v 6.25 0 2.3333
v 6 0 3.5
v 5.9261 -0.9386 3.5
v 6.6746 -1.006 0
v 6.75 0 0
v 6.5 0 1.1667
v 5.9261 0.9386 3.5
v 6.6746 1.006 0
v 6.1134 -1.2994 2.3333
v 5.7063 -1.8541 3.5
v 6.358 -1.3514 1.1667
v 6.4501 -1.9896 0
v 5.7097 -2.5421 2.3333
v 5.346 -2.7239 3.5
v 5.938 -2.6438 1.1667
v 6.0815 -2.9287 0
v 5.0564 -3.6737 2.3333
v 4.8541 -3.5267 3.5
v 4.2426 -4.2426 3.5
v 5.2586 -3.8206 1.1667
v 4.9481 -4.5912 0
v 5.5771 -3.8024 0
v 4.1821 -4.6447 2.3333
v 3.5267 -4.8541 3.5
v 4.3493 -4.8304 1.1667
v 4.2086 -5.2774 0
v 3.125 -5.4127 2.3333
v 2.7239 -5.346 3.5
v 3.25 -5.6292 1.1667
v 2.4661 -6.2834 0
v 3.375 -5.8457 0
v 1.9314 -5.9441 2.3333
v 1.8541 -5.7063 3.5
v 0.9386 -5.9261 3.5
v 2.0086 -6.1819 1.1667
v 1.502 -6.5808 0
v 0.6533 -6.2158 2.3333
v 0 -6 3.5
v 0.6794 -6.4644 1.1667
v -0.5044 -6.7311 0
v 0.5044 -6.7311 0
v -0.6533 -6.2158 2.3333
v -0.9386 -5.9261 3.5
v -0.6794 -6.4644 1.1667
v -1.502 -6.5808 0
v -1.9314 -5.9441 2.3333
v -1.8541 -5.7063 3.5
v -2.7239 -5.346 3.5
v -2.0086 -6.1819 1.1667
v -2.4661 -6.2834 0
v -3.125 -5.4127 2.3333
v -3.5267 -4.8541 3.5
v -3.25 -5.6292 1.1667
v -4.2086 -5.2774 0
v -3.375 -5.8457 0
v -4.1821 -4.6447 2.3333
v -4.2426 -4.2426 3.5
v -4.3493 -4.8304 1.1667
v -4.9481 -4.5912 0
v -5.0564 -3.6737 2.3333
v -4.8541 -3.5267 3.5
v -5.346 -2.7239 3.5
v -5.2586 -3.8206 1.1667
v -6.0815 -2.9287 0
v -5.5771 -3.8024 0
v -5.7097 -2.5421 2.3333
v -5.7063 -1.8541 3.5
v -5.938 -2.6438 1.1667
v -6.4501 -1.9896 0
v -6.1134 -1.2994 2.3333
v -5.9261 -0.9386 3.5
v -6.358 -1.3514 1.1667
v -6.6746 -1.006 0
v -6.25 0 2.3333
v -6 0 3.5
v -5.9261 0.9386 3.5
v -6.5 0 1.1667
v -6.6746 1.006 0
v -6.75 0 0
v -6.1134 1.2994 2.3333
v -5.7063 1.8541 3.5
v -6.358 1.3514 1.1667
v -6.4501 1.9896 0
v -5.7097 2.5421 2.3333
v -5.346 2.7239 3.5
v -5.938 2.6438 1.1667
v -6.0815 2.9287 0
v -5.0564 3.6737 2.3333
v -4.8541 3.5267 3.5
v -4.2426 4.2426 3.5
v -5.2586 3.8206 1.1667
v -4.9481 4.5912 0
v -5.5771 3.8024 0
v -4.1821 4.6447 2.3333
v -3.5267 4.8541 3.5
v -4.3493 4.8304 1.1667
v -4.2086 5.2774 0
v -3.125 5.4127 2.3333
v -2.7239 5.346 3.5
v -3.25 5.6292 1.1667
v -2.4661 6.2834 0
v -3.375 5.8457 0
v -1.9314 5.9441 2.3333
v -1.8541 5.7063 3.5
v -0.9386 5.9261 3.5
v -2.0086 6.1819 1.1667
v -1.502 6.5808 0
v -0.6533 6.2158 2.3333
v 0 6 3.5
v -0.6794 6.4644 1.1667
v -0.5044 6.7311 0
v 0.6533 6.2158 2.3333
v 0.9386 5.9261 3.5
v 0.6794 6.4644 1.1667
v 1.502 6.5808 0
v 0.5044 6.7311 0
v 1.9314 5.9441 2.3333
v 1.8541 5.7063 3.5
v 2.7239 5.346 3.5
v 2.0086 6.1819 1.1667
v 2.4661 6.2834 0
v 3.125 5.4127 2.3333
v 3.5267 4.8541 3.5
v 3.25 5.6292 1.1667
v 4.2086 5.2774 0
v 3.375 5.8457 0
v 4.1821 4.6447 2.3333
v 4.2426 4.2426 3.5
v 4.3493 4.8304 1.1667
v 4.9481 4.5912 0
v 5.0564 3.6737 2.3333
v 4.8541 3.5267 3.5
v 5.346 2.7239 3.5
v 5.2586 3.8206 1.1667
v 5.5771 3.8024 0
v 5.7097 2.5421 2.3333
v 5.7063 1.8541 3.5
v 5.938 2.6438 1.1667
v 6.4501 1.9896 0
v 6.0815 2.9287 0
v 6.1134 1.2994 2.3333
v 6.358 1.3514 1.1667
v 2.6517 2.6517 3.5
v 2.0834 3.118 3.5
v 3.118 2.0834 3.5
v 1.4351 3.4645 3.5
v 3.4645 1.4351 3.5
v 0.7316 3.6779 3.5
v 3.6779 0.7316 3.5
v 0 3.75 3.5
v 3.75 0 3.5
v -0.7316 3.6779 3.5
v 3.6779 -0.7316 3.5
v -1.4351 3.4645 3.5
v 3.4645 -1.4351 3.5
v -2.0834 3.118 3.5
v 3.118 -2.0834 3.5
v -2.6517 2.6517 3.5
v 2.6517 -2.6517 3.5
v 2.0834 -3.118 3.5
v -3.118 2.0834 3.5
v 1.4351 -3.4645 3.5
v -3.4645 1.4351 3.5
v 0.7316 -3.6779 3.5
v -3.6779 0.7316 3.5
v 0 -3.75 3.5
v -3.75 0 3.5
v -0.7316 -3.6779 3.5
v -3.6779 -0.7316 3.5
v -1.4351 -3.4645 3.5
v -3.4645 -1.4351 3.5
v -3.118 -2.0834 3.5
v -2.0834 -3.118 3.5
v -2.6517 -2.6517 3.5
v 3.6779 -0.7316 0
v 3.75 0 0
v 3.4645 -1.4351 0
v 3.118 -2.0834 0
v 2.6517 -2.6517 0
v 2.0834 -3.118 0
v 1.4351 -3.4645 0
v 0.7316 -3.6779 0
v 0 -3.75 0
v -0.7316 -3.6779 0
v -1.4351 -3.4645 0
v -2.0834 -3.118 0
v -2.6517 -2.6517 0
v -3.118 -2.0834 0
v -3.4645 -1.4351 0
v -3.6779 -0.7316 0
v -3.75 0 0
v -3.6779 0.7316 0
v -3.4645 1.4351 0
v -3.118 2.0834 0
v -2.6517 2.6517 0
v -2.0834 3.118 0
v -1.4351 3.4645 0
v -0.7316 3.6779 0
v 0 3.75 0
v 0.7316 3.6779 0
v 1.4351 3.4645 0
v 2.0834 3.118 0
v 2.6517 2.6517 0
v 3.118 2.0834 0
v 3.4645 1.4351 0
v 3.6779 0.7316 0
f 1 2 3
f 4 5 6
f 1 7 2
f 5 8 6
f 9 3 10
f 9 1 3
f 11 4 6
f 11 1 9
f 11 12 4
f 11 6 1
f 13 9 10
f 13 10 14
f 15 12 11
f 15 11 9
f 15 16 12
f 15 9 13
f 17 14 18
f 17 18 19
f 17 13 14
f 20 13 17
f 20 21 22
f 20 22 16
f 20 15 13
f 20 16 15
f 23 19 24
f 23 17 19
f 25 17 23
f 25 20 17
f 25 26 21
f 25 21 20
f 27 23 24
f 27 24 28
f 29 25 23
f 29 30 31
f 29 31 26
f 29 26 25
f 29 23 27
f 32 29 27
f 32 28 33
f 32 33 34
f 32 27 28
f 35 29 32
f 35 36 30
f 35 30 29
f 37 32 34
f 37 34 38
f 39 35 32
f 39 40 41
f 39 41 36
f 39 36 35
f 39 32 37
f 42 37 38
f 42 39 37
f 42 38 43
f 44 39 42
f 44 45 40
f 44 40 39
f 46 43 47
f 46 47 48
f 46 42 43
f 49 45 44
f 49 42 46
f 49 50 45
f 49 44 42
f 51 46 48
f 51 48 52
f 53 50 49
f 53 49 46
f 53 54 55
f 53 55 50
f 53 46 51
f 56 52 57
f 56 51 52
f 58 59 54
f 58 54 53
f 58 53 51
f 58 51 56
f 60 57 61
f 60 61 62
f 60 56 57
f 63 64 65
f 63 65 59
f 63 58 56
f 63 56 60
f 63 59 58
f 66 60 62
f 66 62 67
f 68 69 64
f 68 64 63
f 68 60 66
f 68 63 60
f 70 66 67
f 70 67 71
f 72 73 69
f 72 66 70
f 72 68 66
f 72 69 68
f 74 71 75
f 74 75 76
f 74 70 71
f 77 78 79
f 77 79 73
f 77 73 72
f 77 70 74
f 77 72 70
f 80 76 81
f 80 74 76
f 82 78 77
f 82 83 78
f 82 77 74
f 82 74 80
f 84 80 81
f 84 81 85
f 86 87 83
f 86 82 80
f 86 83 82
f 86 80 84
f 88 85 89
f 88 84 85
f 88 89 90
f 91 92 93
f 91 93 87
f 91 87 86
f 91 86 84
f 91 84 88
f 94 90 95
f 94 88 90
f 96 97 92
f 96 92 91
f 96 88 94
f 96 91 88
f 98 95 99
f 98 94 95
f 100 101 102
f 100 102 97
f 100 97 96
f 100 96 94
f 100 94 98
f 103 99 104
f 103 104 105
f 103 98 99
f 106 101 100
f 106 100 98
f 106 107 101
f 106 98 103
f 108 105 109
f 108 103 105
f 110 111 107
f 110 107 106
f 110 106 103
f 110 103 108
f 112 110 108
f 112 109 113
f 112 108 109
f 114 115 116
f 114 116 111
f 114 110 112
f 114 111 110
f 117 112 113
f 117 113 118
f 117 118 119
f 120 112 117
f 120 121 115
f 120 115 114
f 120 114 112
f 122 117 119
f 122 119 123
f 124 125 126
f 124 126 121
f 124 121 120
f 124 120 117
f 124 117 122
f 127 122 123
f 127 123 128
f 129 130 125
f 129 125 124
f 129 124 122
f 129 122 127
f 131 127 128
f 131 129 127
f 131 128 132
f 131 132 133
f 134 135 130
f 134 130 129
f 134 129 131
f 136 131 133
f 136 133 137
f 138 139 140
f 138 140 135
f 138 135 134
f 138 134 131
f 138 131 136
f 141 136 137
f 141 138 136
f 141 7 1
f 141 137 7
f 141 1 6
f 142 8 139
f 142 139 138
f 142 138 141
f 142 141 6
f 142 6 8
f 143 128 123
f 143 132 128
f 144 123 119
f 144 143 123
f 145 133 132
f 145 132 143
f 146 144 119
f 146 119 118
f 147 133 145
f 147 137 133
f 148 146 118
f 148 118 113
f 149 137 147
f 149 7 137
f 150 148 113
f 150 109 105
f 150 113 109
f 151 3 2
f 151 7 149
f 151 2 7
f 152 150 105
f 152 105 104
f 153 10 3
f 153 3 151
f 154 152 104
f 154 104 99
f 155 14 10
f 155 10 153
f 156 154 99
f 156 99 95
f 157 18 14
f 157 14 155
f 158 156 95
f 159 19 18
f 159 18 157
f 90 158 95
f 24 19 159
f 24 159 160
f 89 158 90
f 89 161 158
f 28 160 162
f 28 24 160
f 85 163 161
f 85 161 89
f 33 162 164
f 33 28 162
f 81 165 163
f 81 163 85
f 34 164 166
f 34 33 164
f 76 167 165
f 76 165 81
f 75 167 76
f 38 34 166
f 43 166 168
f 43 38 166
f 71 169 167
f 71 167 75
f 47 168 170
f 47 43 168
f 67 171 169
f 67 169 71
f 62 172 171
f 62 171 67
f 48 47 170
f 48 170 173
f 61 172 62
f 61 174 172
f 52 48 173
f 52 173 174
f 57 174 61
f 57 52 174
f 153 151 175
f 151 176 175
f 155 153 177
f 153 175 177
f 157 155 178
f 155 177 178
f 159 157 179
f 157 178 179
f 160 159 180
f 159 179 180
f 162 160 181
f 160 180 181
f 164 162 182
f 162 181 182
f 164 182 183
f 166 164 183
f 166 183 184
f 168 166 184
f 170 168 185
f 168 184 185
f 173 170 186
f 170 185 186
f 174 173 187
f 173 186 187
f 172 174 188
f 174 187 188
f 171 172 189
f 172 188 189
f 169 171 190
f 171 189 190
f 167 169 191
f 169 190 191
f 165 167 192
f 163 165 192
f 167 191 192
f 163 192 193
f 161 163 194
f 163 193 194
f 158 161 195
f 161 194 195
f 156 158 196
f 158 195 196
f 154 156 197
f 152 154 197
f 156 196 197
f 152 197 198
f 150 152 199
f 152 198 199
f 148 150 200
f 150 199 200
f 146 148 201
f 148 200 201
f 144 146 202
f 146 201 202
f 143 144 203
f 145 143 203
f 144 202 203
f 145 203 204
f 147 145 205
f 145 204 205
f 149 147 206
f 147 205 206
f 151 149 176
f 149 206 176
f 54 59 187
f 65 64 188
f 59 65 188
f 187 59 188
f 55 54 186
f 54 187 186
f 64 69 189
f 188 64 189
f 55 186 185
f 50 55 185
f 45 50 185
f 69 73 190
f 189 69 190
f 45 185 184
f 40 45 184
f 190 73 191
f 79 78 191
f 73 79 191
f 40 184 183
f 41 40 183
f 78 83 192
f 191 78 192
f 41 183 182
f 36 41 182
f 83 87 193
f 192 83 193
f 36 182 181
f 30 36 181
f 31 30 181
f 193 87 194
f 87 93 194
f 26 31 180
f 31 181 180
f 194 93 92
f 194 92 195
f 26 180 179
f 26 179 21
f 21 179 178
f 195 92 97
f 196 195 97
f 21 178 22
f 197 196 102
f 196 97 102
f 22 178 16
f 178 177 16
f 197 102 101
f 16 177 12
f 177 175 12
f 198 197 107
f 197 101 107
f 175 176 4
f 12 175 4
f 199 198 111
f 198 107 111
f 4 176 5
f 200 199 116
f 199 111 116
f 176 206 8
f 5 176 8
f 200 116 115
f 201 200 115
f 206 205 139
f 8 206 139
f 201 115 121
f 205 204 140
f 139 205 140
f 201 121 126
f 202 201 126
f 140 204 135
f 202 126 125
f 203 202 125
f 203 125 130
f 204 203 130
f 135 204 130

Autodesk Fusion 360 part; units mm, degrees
sketch "Esquisse1" plane through (0, 0, 0) normal (0, 0, 1) x (1, 0, 0)
  circle A0 centre (0, 0) radius 6.75
  dimension "d1" = 13.5
extrude "Extrusion1" add sketch "Esquisse1" along normal blind 3.5 makes body 1
sketch "Esquisse2" plane through (0, 0, 3.5) normal (0, 0, 1) x (-1, 0, 0)
  circle A0 centre (0, 0) radius 6.75
  circle A1 centre (0, 0) radius 6
  dimension "d4" = 12
loft "Lissage1" add profiles "Esquisse1", "Esquisse2" section 1 section 2 contours A1 separate body makes body 2
sketch "Esquisse3" plane through (0, 0, 0) normal (0, 0, 1) x (1, 0, 0)
  circle A0 centre (0, 0) radius 3.375
  dimension "d5" = 6.75
extrude "Extrusion2" cut sketch "Esquisse3" along normal blind 33 bodies 2
sketch "Esquisse4" plane through (0, 0, 0) normal (0, 0, 1) x (1, 0, 0)
  circle A0 centre (0, 0) radius 3.75
  dimension "d8" = 7.5
extrude "Extrusion3" cut sketch "Esquisse4" along normal blind 23 bodies 2
hidden bodies 1
